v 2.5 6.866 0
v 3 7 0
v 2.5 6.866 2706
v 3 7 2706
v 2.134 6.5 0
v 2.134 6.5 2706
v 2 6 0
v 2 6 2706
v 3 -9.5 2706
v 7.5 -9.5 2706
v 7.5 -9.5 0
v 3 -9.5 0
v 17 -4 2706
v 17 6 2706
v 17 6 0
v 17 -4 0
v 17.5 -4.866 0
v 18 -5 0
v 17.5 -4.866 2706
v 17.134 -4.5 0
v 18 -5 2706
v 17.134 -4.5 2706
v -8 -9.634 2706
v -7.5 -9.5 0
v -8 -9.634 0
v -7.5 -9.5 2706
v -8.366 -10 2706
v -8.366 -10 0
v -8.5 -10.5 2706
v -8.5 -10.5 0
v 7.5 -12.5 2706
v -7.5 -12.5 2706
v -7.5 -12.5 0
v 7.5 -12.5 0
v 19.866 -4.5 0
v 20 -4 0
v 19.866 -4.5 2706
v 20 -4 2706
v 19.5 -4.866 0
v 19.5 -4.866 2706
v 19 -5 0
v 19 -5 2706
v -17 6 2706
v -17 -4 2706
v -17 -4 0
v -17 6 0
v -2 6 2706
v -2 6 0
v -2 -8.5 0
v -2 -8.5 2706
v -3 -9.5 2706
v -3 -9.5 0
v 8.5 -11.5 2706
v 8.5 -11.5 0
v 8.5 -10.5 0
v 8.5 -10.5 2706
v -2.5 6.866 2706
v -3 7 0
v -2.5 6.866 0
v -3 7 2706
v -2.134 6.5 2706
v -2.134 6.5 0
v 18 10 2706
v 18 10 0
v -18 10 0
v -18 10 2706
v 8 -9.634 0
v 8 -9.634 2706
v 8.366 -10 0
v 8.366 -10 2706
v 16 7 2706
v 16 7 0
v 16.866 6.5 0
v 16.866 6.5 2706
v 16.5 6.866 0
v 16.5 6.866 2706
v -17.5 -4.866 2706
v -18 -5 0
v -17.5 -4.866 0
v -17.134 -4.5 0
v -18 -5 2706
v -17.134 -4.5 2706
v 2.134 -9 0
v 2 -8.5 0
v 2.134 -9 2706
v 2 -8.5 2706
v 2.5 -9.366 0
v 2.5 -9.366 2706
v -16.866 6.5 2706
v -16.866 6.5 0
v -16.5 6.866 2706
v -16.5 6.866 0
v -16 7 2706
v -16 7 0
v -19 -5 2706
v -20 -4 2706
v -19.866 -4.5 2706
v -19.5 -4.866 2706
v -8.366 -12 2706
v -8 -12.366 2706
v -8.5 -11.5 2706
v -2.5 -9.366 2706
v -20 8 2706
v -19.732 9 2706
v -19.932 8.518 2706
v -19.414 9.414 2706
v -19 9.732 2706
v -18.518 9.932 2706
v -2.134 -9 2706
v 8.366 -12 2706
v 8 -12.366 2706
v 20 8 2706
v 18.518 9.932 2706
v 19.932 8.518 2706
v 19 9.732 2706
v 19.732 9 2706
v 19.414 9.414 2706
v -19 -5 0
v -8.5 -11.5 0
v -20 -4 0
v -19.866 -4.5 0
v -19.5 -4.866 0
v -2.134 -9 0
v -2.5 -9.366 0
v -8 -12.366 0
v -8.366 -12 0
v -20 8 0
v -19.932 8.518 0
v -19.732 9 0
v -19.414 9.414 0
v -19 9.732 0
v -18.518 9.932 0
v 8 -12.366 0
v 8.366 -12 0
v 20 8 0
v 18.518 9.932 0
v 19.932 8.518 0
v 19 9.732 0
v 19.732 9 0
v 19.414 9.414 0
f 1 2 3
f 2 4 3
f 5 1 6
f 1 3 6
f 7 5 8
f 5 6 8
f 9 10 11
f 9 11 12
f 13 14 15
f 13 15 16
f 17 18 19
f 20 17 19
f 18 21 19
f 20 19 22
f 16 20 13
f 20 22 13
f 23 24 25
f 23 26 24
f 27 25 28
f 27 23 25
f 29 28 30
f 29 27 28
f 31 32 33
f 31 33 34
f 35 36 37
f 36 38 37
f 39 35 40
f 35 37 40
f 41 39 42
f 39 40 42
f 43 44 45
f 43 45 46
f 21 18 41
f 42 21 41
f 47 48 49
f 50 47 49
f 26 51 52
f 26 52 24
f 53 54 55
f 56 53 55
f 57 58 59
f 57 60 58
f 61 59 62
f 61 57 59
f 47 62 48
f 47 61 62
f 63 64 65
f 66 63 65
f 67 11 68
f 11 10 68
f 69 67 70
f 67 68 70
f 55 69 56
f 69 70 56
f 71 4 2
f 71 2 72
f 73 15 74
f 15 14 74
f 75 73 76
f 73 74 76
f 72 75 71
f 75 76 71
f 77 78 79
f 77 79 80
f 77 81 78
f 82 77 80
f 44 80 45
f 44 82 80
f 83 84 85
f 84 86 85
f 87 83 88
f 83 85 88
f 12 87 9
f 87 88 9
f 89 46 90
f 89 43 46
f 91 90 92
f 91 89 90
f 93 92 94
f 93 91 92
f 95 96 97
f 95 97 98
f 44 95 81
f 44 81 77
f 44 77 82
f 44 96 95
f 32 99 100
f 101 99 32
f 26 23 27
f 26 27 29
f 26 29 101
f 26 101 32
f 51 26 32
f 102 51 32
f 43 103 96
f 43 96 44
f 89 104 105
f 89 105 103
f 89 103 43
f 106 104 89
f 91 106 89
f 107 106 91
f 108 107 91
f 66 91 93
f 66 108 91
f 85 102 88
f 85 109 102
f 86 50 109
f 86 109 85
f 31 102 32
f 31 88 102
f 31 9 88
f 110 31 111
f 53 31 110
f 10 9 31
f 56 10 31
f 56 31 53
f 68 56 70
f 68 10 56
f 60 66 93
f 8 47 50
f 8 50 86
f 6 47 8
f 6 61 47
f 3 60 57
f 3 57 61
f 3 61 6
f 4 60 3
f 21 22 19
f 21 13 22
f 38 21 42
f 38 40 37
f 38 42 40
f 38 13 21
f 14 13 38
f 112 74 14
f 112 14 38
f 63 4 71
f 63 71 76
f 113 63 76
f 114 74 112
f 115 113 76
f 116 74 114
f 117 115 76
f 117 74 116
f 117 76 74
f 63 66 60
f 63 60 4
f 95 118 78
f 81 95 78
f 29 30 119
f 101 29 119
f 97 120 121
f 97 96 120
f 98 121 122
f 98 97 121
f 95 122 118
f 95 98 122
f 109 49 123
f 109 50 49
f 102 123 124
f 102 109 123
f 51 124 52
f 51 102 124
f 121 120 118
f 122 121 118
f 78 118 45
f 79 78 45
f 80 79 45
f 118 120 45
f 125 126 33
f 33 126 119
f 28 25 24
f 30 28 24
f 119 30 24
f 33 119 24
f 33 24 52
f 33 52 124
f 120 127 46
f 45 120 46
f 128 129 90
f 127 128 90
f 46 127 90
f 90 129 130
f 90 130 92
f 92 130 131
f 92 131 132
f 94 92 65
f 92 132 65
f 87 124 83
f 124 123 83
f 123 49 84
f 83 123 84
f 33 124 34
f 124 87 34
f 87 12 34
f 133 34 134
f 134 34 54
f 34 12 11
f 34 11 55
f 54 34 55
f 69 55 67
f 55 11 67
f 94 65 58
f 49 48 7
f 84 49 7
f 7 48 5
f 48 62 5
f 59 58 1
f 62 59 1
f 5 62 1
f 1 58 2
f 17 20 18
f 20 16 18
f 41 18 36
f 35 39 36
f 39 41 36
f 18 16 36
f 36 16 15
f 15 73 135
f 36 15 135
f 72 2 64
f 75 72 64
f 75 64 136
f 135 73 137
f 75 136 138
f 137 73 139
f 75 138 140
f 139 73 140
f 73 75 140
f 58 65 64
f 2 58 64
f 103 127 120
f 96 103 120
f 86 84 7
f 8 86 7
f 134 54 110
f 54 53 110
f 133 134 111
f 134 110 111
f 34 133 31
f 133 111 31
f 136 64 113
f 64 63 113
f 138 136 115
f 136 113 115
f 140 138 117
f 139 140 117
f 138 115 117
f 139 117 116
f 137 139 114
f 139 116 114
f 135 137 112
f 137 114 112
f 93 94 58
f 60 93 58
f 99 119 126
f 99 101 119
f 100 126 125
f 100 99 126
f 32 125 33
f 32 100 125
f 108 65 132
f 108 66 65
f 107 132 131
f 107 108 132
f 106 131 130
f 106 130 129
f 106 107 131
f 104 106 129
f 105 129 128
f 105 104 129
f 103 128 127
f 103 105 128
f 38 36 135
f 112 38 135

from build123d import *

# Parameters (mm, degrees)
F1_DEPTH = 2706
F2_R     = 2
F3_R     = 1


with BuildPart() as f1:
    # F0 (on Top) → F1 (new body)
    with BuildSketch(Plane.XY):
        Polygon((20, 10), (-20, 10), (-20, -5), (-17, -5), (-17, 7), (-2, 7), (-2, -9.5), (-8.5, -9.5), (-8.5, -12.5), (0, -12.5), (8.5, -12.5), (8.5, -9.5), (2, -9.5), (2, 7), (17, 7), (17, -5), (20, -5), align=None)
    extrude(amount=F1_DEPTH)

    # F2
    f2_edges = [f1.edges().sort_by_distance(p)[0] for p in [
        (-20, 10, 1353),
        (20, 10, 1353),
    ]]
    fillet(f2_edges, radius=F2_R)

    # F3
    f3_edges = [f1.edges().sort_by_distance(p)[0] for p in [
        (-17, -5, 1353),
        (-20, -5, 1353),
        (-17, 7, 1353),
        (2, 7, 1353),
        (17, -5, 1353),
        (20, -5, 1353),
        (8.5, -9.5, 1353),
        (8.5, -12.5, 1353),
        (-8.5, -12.5, 1353),
        (-8.5, -9.5, 1353),
        (-2, -9.5, 1353),
        (-2, 7, 1353),
        (17, 7, 1353),
        (2, -9.5, 1353),
    ]]
    fillet(f3_edges, radius=F3_R)


solid = f1.part
